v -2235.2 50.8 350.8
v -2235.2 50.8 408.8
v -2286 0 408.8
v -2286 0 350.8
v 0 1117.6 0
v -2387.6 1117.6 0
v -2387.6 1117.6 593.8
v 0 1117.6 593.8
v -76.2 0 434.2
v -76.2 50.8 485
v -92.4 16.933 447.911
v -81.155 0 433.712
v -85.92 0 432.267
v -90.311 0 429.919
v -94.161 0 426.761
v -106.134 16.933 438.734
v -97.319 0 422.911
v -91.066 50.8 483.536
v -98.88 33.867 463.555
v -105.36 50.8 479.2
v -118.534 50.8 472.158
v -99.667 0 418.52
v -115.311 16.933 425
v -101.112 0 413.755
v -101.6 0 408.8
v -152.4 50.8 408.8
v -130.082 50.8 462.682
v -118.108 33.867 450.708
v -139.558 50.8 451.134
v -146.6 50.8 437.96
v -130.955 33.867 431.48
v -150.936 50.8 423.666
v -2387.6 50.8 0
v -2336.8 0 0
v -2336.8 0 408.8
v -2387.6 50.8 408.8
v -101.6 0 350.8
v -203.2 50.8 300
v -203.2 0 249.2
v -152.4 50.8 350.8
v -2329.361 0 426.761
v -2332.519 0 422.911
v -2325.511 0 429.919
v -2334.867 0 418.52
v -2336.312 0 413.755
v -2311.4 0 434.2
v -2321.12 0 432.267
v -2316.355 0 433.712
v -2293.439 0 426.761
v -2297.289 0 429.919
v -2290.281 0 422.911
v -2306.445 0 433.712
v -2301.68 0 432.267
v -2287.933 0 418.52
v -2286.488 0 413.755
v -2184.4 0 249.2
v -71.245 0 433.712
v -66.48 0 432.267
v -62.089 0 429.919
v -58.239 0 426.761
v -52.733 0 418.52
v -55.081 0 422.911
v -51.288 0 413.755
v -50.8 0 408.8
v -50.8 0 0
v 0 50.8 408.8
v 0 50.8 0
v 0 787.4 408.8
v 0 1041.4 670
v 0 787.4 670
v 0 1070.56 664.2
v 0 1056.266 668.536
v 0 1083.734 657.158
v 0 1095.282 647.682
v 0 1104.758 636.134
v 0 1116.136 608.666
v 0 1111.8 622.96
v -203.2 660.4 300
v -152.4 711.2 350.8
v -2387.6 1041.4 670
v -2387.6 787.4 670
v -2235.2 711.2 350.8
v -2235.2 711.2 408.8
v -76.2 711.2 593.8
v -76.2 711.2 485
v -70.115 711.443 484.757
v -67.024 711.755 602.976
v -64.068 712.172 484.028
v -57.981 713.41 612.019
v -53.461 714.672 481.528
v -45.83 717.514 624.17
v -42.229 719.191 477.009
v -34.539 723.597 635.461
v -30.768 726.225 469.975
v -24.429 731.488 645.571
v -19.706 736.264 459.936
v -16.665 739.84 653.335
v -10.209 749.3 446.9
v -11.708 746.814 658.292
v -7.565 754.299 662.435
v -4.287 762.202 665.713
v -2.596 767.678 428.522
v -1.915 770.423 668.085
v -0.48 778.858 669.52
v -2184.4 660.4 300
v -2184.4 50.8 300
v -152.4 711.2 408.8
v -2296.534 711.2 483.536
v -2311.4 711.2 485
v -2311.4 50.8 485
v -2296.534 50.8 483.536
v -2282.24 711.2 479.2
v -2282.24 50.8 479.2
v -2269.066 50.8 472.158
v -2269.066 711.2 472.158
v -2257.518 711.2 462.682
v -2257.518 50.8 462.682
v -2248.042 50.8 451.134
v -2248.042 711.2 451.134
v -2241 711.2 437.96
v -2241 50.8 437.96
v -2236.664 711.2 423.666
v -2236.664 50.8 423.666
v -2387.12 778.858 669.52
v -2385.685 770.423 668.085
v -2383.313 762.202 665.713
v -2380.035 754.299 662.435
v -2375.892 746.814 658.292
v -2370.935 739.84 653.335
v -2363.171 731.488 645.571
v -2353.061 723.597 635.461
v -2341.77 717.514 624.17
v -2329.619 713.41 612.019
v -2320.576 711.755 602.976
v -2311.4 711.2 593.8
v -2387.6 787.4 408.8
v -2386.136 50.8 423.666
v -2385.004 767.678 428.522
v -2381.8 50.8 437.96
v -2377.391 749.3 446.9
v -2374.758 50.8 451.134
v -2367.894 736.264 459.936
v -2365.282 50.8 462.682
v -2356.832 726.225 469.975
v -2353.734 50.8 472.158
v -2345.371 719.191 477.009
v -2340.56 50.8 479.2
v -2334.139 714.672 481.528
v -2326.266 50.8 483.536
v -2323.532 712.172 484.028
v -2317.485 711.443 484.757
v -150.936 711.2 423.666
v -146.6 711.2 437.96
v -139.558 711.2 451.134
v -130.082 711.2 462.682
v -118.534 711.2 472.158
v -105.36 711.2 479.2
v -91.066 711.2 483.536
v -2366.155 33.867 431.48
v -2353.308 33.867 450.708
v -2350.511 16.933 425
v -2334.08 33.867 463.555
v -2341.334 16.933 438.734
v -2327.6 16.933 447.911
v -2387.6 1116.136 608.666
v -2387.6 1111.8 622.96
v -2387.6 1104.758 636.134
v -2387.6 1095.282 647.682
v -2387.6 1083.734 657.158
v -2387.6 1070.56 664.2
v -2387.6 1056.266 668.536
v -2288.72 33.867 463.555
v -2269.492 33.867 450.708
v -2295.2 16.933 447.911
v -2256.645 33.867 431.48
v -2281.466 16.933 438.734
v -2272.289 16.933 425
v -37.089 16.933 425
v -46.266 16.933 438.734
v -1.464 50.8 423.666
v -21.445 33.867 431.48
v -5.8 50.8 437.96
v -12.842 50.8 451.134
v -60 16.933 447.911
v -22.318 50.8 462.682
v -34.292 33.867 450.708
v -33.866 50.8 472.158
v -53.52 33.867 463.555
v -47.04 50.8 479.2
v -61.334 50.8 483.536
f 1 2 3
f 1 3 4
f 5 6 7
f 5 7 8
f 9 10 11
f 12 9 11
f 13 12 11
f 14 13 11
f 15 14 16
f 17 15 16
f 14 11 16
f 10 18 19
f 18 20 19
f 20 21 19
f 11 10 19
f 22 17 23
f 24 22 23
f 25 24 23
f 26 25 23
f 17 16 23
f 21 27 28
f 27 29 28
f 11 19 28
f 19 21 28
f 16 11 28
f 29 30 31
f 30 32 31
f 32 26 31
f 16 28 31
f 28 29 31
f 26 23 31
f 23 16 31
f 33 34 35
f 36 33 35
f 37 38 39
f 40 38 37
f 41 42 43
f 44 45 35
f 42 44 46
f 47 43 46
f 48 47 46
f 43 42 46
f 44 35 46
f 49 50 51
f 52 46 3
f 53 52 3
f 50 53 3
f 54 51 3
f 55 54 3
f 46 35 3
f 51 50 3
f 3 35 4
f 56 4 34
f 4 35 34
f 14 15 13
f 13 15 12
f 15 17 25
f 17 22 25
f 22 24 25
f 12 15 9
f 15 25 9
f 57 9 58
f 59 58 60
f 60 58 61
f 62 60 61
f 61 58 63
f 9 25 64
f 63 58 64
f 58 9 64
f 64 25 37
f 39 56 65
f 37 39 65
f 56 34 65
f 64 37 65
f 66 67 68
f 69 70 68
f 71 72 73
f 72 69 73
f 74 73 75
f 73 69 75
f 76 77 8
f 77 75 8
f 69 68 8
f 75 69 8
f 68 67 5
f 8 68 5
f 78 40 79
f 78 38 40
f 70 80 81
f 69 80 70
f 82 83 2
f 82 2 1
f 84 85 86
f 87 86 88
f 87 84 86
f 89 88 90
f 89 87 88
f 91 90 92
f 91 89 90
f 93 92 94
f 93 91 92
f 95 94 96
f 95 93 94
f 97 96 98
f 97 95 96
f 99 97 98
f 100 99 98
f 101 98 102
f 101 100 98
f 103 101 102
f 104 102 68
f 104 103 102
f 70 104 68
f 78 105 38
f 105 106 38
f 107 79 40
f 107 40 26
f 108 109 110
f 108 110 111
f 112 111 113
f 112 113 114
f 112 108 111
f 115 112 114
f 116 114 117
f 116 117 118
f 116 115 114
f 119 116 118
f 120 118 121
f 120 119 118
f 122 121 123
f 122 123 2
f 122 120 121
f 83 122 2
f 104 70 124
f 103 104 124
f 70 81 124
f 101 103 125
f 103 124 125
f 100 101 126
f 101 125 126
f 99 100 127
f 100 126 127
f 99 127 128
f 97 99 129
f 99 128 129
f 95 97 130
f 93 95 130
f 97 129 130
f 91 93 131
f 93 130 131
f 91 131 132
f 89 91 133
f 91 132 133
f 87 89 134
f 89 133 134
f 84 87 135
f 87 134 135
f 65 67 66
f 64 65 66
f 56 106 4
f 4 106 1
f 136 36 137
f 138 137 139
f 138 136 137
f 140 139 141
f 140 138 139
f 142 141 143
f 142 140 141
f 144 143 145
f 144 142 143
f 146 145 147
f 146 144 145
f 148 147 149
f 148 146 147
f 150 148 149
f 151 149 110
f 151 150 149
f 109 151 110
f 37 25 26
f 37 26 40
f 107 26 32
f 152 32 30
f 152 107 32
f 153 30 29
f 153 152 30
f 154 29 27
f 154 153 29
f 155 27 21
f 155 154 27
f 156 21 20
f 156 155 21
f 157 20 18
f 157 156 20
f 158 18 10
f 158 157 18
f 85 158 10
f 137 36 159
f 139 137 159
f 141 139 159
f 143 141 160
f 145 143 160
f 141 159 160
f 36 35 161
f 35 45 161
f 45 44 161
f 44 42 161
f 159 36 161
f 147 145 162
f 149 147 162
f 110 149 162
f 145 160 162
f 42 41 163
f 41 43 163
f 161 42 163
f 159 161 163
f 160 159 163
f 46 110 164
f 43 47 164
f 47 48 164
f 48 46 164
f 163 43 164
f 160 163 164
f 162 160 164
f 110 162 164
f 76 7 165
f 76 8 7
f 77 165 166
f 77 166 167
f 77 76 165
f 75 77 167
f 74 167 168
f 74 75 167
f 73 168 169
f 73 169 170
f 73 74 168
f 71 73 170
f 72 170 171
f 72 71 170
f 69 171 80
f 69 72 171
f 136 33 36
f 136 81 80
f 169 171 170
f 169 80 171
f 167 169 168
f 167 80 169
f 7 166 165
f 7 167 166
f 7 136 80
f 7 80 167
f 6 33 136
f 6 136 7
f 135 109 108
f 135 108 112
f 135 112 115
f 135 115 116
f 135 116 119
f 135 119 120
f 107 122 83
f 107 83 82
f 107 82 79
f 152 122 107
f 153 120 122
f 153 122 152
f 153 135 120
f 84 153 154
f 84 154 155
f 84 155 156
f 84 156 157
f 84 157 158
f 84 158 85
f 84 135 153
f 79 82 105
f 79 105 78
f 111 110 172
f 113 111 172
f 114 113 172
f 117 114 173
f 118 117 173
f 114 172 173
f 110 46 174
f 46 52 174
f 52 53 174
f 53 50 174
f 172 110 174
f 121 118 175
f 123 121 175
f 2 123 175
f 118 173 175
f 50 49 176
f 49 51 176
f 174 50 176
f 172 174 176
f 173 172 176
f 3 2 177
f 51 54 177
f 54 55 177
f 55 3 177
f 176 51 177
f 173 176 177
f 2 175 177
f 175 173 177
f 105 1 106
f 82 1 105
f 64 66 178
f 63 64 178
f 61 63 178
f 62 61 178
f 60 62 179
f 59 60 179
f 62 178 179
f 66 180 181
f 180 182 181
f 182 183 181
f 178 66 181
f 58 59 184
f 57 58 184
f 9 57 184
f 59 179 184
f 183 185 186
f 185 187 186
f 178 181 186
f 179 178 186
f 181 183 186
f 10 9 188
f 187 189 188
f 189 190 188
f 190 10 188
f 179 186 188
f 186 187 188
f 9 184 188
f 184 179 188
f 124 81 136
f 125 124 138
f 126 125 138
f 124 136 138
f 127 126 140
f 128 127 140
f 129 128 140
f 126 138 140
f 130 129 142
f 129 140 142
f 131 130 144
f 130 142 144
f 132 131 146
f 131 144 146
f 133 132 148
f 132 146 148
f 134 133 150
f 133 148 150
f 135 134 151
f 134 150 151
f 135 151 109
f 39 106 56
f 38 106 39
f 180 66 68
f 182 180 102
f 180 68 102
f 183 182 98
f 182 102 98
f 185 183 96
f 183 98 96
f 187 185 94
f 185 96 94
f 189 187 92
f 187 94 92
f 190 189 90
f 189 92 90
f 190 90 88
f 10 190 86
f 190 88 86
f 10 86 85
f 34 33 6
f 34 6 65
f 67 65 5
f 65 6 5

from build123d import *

# Parameters (mm, degrees)
F0_W     = 2387.6
F0_H     = 1117.6
F1_DEPTH = 670
F3_DEPTH = 711.2
F4_R     = 76.19999
F5_SIZE  = 50.8


# Not quite as in the source:
# - a fillet or chamfer is up to 0.001 mm smaller than in the source, because OpenCascade refuses the exact size


with BuildPart() as f1:
    # F0 (on Top) → F1 (new body)
    with BuildSketch(Plane.XY):
        with Locations((-1193.8, 558.8)):
            Rectangle(F0_W, F0_H)
    extrude(amount=F1_DEPTH)

    # F2 (on face) → F3 (cut)
    with BuildSketch(Plane.XZ):
        Polygon((-2235.2, 300), (-152.4, 300), (-152.4, 485), (0, 485), (0, 670), (-152.4, 670), (-2235.2, 670), (-2387.6, 670), (-2387.6, 485), (-2235.2, 485), align=None)
    extrude(amount=-F3_DEPTH, mode=Mode.SUBTRACT)

    # F4 (radius 76.2 in the source; OpenCascade refuses exactly that, so slightly less here)
    f4_edges = [f1.edges().sort_by_distance(p)[0] for p in [
        (-2235.2, 355.6, 485),
        (-1193.8, 711.2, 670),
        (-152.4, 355.6, 485),
        (0, 355.6, 485),
        (-1193.8, 1117.6, 670),
        (-2387.6, 355.6, 485),
        (-2387.6, 711.2, 577.5),
        (0, 711.2, 577.5),
    ]]
    fillet(f4_edges, radius=F4_R)

    # F5
    f5_edges = [f1.edges().sort_by_distance(p)[0] for p in [
        (-1193.8, 711.2, 300),
        (-2235.2, 355.6, 300),
        (-152.4, 355.6, 300),
        (-1193.8, 0, 300),
        (0, 0, 204.400005),
        (-22.31846, 0, 462.68154),
        (-76.2, 0, 485),
        (-2387.6, 0, 204.400005),
        (-130.08154, 0, 462.68154),
        (-2365.28154, 0, 462.68154),
        (-2311.4, 0, 485),
        (-2257.51846, 0, 462.68154),
    ]]
    chamfer(f5_edges, length=F5_SIZE)


solid = f1.part
